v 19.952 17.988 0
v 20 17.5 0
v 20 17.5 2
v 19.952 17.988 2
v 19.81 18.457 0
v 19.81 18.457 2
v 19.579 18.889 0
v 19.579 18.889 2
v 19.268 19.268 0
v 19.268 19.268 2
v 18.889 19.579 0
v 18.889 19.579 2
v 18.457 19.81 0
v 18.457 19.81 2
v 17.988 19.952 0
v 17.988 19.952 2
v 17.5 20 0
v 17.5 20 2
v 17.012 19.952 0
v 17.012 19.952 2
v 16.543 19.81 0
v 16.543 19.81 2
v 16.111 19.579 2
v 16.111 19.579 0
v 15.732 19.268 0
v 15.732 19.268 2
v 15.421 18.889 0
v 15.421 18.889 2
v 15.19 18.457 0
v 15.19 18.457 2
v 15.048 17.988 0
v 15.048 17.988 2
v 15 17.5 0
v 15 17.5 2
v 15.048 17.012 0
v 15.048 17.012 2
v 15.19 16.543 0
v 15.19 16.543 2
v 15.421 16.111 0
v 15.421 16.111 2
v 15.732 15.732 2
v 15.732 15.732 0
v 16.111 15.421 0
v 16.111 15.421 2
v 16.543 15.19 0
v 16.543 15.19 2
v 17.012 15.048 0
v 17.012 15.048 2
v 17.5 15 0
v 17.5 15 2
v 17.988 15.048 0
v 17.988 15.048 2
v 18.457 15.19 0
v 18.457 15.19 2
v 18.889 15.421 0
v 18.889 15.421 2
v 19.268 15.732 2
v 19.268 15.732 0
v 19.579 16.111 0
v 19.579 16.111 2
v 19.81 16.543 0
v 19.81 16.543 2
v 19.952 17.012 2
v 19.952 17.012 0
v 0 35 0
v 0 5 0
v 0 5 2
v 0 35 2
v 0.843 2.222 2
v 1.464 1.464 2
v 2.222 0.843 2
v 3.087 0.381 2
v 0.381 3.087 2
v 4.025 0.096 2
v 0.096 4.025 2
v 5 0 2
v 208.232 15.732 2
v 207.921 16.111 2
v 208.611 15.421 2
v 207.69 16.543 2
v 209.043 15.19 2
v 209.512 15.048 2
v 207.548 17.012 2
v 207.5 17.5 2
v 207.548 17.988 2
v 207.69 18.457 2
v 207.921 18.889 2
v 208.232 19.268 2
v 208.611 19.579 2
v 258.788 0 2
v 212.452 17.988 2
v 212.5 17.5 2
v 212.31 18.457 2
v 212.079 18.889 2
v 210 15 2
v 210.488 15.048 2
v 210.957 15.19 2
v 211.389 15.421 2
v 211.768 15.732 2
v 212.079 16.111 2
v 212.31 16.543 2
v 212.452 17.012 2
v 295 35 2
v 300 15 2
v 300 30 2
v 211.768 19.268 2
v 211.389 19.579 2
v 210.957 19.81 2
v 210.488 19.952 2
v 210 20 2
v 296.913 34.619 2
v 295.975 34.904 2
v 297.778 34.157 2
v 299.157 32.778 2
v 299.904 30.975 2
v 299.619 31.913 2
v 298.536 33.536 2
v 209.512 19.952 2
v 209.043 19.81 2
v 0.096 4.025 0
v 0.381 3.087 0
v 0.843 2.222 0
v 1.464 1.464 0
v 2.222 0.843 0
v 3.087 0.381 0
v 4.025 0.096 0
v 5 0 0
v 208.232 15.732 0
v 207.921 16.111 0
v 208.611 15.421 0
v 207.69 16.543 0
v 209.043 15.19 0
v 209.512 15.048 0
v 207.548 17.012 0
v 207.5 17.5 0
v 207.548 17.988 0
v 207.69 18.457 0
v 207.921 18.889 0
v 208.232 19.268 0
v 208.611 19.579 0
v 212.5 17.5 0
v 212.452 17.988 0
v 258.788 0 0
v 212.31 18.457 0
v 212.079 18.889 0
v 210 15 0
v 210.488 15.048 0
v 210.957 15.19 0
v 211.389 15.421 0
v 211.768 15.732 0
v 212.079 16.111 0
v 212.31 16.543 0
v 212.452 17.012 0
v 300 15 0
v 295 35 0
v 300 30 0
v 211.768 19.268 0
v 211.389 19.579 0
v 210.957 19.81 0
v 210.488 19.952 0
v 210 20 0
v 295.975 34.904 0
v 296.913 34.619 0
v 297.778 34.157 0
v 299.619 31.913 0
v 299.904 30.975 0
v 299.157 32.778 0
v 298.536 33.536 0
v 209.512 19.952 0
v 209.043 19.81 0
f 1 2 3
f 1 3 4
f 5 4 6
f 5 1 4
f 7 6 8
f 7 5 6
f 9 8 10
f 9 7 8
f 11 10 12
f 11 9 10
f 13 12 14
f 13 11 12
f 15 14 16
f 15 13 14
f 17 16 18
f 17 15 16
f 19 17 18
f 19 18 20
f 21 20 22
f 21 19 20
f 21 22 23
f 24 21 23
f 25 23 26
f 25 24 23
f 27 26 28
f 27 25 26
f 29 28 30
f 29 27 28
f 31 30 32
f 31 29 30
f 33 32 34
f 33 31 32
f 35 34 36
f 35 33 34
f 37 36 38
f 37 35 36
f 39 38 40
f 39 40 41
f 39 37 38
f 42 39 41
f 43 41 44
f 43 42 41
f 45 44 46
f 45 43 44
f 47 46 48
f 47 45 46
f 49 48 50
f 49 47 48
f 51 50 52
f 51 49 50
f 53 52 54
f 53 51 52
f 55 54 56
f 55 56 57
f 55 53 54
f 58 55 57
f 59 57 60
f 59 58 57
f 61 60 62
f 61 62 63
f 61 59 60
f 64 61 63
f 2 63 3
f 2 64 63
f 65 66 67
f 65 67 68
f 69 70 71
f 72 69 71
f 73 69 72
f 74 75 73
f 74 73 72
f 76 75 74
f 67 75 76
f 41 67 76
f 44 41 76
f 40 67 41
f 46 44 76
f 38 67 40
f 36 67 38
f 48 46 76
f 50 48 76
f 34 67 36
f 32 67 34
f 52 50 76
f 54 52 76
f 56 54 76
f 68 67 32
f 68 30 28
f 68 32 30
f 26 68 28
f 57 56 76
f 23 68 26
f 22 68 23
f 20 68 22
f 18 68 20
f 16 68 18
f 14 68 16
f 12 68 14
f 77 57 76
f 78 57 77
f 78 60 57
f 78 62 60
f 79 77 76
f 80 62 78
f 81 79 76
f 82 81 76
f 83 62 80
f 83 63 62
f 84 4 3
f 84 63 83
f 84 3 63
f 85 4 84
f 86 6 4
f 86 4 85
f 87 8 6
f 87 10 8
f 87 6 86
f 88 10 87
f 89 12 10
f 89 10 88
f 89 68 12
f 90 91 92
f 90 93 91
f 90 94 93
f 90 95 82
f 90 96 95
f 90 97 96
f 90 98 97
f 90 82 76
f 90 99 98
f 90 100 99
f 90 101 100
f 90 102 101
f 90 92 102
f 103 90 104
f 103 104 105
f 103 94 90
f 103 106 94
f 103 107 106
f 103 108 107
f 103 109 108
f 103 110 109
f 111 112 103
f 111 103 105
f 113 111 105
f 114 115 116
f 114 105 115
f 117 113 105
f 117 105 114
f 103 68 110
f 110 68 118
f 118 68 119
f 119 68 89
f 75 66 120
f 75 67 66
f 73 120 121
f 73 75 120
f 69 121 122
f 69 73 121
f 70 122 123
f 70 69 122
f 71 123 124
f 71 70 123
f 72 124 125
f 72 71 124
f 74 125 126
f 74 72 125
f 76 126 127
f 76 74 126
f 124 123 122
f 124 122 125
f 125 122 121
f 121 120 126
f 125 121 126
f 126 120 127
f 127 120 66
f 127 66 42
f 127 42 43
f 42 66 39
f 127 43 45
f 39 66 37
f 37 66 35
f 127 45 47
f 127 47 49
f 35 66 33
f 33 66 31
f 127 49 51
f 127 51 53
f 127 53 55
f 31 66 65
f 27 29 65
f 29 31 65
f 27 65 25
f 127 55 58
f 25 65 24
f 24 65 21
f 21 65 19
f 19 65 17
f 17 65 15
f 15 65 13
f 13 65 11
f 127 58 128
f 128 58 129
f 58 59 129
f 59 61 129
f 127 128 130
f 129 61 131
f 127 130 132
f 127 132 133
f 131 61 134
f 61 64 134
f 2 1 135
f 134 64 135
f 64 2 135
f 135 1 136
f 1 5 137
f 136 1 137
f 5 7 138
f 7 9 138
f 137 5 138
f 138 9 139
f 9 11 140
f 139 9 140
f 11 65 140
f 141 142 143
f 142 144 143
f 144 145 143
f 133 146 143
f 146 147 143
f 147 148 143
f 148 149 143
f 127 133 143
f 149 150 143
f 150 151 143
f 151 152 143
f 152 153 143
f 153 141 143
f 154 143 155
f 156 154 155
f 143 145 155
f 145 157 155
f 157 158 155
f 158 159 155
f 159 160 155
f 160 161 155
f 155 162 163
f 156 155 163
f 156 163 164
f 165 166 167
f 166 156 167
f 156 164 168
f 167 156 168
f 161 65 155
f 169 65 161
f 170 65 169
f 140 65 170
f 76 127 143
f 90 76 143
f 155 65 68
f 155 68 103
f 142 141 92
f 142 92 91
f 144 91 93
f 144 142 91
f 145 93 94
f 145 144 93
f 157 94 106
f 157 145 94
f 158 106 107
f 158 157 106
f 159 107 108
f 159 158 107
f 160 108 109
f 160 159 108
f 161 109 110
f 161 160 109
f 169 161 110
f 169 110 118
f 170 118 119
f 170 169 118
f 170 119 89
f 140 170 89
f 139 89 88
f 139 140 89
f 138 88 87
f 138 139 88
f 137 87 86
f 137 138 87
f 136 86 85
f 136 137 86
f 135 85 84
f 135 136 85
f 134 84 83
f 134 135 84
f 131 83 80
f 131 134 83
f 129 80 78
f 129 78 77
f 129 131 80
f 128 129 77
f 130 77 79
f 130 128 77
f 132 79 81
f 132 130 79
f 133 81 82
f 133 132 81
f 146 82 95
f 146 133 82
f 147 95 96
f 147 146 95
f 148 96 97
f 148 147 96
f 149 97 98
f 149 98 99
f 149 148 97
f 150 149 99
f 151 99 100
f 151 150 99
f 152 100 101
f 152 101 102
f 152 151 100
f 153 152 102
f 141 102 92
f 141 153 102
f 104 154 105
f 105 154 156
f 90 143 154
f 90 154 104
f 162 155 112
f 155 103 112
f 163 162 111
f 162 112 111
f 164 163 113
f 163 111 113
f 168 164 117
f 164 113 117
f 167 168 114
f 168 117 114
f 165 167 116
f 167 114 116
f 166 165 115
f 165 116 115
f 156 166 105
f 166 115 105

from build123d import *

# Parameters (mm, degrees)
F0_W     = 300
F0_H     = 35
F0_R     = 2.5
F1_DEPTH = 2
F2_R     = 5
F3_SIZE2 = 41.2121612918
F3_SIZE  = 15


with BuildPart() as f1:
    # F0 (on Top) → F1 (new body)
    with BuildSketch(Plane.XY):
        with Locations((150, 17.5)):
            Rectangle(F0_W, F0_H)
        with Locations((17.5, 17.5)):
            Circle(F0_R, mode=Mode.SUBTRACT)
        with Locations((210, 17.5)):
            Circle(F0_R, mode=Mode.SUBTRACT)
    extrude(amount=F1_DEPTH)

    # F2
    f2_edges = [f1.edges().sort_by_distance(p)[0] for p in [
        (0, 0, 1),
        (300, 35, 1),
    ]]
    fillet(f2_edges, radius=F2_R)

    # F3
    f3_edges = [f1.edges().sort_by_distance(p)[0] for p in [
        (300, 0, 1),
    ]]
    f3_side = f1.faces().sort_by_distance((300, 15, 1))[0]
    chamfer(f3_edges, length=F3_SIZE, length2=F3_SIZE2, reference=f3_side)


solid = f1.part
